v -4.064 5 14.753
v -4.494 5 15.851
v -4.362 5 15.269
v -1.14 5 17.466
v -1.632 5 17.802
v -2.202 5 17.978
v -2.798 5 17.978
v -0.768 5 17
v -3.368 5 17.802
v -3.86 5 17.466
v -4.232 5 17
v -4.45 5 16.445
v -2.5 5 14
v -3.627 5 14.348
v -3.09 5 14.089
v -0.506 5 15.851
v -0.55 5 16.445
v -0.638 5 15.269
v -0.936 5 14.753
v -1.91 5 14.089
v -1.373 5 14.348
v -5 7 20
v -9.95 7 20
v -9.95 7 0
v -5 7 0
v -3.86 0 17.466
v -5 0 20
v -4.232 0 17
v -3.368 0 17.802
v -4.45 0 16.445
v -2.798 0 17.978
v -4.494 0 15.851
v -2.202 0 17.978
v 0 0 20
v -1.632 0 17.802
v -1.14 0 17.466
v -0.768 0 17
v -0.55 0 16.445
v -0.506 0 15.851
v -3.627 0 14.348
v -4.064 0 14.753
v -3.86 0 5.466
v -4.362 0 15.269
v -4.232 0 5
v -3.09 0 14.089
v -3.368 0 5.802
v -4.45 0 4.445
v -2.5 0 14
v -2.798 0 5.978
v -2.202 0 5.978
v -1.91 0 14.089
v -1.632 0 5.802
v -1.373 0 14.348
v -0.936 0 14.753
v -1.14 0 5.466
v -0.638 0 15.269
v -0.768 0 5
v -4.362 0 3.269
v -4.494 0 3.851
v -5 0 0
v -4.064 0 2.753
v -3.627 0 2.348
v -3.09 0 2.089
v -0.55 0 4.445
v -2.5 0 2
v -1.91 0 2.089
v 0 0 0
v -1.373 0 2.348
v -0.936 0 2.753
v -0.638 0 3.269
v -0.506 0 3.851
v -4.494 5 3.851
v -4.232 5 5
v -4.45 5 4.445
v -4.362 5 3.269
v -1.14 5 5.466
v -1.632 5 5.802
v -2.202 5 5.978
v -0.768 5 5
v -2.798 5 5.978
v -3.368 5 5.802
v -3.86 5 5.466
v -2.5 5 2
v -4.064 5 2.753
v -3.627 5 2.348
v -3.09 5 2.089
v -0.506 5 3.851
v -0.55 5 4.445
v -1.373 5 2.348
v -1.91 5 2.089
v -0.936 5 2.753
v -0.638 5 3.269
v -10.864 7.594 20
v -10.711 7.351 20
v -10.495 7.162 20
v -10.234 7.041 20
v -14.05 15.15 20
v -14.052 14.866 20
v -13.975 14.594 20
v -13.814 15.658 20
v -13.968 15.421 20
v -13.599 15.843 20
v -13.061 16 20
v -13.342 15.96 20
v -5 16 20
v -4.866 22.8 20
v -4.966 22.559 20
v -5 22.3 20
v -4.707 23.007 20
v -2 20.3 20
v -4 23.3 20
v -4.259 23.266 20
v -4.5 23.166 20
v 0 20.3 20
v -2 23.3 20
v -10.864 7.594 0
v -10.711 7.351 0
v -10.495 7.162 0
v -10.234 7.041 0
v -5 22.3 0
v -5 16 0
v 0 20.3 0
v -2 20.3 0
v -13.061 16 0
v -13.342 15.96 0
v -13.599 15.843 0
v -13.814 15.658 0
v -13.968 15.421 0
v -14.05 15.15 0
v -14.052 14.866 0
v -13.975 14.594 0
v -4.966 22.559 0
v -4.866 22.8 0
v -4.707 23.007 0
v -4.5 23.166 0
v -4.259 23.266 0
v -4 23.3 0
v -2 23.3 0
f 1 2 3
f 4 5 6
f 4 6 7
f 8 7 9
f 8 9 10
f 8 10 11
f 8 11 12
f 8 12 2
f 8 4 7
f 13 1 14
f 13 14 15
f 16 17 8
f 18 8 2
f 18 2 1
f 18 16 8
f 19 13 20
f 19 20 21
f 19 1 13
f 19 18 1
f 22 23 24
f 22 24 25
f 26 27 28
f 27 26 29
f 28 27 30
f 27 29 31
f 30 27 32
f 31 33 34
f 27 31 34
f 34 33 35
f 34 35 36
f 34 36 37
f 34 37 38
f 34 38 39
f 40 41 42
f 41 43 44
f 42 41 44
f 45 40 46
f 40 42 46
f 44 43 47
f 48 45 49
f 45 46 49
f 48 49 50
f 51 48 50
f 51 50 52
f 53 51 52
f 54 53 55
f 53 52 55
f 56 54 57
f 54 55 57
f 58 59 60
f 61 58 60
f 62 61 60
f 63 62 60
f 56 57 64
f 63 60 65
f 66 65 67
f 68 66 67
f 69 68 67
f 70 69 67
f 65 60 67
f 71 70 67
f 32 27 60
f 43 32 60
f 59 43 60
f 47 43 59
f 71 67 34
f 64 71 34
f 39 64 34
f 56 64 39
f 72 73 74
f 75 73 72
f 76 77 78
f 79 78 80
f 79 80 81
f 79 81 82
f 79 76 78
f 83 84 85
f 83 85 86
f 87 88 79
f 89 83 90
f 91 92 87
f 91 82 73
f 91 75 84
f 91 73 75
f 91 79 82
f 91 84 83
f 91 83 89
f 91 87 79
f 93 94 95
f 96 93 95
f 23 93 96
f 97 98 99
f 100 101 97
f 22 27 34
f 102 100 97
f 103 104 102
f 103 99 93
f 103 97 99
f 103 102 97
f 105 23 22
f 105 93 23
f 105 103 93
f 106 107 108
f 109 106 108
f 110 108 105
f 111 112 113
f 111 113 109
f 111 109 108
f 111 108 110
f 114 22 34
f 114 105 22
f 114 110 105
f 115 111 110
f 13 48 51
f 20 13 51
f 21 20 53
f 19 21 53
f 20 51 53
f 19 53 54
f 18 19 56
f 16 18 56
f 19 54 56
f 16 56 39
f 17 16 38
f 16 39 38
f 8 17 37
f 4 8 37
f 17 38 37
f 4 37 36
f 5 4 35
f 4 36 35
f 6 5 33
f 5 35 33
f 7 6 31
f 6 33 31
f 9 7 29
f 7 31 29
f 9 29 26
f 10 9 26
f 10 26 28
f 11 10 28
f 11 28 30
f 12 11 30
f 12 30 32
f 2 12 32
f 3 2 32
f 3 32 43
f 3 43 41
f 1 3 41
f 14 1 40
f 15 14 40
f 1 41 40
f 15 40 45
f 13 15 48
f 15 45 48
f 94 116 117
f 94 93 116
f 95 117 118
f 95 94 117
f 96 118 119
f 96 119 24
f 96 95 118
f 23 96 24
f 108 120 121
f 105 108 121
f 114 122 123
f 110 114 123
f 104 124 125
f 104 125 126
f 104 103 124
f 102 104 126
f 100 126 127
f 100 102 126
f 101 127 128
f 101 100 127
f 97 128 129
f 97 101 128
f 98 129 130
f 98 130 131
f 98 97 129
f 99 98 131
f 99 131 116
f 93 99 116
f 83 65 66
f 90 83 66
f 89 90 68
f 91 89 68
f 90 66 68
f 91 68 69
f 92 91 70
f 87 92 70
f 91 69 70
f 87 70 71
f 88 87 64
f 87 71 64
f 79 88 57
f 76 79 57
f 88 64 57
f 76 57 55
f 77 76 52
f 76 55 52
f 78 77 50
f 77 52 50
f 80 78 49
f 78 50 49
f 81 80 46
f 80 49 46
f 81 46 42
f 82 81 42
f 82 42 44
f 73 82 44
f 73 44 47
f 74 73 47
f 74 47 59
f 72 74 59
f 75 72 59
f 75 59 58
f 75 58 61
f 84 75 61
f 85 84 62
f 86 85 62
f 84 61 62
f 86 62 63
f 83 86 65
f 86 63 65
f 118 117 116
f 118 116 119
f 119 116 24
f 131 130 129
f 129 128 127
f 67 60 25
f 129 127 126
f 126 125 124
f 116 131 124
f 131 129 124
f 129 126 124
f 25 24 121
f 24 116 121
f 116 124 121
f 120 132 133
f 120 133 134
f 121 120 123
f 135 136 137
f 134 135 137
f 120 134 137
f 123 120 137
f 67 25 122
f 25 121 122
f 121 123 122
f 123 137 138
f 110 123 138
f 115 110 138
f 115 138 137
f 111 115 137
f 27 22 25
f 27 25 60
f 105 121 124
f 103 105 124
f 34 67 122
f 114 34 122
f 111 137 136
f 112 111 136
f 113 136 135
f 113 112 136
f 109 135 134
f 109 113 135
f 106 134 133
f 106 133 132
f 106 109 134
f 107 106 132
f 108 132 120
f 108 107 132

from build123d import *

# Parameters (mm, degrees)
BOSS_EXTRU_1_DEPTH      = 20
CONG_1_R                = 1
ESQUISSE3_R             = 2
ENL_V_MAT_EXTRU_1_DEPTH = 5


with BuildPart() as part:
    # Esquisse1 → Boss.-Extru.1 (new body)
    with BuildSketch(Plane.XY):
        Polygon((-2, 23.3), (-5, 23.3), (-5, 16), (-14.6, 16), (-10.6, 7), (-5, 7), (-5, 0), (0, 0), (0, 20.3), (-2, 20.3), align=None)
    extrude(amount=BOSS_EXTRU_1_DEPTH)

    # Congé1
    cong_1_edges = [part.edges().sort_by_distance(p)[0] for p in [
        (-10.6, 7, 10),
        (-14.6, 16, 10),
        (-5, 23.3, 10),
    ]]
    fillet(cong_1_edges, radius=CONG_1_R)

    # Esquisse3 → Enlèv. mat.-Extru.1 (cut)
    with BuildSketch(Plane.XZ):
        with Locations(Location((-2.5, 4, 0), (0, 0, 270))):
            Circle(ESQUISSE3_R)
        with Locations(Location((-2.5, 16, 0), (0, 0, 270))):
            Circle(ESQUISSE3_R)
    extrude(amount=-ENL_V_MAT_EXTRU_1_DEPTH, mode=Mode.SUBTRACT)


solid = part.part
